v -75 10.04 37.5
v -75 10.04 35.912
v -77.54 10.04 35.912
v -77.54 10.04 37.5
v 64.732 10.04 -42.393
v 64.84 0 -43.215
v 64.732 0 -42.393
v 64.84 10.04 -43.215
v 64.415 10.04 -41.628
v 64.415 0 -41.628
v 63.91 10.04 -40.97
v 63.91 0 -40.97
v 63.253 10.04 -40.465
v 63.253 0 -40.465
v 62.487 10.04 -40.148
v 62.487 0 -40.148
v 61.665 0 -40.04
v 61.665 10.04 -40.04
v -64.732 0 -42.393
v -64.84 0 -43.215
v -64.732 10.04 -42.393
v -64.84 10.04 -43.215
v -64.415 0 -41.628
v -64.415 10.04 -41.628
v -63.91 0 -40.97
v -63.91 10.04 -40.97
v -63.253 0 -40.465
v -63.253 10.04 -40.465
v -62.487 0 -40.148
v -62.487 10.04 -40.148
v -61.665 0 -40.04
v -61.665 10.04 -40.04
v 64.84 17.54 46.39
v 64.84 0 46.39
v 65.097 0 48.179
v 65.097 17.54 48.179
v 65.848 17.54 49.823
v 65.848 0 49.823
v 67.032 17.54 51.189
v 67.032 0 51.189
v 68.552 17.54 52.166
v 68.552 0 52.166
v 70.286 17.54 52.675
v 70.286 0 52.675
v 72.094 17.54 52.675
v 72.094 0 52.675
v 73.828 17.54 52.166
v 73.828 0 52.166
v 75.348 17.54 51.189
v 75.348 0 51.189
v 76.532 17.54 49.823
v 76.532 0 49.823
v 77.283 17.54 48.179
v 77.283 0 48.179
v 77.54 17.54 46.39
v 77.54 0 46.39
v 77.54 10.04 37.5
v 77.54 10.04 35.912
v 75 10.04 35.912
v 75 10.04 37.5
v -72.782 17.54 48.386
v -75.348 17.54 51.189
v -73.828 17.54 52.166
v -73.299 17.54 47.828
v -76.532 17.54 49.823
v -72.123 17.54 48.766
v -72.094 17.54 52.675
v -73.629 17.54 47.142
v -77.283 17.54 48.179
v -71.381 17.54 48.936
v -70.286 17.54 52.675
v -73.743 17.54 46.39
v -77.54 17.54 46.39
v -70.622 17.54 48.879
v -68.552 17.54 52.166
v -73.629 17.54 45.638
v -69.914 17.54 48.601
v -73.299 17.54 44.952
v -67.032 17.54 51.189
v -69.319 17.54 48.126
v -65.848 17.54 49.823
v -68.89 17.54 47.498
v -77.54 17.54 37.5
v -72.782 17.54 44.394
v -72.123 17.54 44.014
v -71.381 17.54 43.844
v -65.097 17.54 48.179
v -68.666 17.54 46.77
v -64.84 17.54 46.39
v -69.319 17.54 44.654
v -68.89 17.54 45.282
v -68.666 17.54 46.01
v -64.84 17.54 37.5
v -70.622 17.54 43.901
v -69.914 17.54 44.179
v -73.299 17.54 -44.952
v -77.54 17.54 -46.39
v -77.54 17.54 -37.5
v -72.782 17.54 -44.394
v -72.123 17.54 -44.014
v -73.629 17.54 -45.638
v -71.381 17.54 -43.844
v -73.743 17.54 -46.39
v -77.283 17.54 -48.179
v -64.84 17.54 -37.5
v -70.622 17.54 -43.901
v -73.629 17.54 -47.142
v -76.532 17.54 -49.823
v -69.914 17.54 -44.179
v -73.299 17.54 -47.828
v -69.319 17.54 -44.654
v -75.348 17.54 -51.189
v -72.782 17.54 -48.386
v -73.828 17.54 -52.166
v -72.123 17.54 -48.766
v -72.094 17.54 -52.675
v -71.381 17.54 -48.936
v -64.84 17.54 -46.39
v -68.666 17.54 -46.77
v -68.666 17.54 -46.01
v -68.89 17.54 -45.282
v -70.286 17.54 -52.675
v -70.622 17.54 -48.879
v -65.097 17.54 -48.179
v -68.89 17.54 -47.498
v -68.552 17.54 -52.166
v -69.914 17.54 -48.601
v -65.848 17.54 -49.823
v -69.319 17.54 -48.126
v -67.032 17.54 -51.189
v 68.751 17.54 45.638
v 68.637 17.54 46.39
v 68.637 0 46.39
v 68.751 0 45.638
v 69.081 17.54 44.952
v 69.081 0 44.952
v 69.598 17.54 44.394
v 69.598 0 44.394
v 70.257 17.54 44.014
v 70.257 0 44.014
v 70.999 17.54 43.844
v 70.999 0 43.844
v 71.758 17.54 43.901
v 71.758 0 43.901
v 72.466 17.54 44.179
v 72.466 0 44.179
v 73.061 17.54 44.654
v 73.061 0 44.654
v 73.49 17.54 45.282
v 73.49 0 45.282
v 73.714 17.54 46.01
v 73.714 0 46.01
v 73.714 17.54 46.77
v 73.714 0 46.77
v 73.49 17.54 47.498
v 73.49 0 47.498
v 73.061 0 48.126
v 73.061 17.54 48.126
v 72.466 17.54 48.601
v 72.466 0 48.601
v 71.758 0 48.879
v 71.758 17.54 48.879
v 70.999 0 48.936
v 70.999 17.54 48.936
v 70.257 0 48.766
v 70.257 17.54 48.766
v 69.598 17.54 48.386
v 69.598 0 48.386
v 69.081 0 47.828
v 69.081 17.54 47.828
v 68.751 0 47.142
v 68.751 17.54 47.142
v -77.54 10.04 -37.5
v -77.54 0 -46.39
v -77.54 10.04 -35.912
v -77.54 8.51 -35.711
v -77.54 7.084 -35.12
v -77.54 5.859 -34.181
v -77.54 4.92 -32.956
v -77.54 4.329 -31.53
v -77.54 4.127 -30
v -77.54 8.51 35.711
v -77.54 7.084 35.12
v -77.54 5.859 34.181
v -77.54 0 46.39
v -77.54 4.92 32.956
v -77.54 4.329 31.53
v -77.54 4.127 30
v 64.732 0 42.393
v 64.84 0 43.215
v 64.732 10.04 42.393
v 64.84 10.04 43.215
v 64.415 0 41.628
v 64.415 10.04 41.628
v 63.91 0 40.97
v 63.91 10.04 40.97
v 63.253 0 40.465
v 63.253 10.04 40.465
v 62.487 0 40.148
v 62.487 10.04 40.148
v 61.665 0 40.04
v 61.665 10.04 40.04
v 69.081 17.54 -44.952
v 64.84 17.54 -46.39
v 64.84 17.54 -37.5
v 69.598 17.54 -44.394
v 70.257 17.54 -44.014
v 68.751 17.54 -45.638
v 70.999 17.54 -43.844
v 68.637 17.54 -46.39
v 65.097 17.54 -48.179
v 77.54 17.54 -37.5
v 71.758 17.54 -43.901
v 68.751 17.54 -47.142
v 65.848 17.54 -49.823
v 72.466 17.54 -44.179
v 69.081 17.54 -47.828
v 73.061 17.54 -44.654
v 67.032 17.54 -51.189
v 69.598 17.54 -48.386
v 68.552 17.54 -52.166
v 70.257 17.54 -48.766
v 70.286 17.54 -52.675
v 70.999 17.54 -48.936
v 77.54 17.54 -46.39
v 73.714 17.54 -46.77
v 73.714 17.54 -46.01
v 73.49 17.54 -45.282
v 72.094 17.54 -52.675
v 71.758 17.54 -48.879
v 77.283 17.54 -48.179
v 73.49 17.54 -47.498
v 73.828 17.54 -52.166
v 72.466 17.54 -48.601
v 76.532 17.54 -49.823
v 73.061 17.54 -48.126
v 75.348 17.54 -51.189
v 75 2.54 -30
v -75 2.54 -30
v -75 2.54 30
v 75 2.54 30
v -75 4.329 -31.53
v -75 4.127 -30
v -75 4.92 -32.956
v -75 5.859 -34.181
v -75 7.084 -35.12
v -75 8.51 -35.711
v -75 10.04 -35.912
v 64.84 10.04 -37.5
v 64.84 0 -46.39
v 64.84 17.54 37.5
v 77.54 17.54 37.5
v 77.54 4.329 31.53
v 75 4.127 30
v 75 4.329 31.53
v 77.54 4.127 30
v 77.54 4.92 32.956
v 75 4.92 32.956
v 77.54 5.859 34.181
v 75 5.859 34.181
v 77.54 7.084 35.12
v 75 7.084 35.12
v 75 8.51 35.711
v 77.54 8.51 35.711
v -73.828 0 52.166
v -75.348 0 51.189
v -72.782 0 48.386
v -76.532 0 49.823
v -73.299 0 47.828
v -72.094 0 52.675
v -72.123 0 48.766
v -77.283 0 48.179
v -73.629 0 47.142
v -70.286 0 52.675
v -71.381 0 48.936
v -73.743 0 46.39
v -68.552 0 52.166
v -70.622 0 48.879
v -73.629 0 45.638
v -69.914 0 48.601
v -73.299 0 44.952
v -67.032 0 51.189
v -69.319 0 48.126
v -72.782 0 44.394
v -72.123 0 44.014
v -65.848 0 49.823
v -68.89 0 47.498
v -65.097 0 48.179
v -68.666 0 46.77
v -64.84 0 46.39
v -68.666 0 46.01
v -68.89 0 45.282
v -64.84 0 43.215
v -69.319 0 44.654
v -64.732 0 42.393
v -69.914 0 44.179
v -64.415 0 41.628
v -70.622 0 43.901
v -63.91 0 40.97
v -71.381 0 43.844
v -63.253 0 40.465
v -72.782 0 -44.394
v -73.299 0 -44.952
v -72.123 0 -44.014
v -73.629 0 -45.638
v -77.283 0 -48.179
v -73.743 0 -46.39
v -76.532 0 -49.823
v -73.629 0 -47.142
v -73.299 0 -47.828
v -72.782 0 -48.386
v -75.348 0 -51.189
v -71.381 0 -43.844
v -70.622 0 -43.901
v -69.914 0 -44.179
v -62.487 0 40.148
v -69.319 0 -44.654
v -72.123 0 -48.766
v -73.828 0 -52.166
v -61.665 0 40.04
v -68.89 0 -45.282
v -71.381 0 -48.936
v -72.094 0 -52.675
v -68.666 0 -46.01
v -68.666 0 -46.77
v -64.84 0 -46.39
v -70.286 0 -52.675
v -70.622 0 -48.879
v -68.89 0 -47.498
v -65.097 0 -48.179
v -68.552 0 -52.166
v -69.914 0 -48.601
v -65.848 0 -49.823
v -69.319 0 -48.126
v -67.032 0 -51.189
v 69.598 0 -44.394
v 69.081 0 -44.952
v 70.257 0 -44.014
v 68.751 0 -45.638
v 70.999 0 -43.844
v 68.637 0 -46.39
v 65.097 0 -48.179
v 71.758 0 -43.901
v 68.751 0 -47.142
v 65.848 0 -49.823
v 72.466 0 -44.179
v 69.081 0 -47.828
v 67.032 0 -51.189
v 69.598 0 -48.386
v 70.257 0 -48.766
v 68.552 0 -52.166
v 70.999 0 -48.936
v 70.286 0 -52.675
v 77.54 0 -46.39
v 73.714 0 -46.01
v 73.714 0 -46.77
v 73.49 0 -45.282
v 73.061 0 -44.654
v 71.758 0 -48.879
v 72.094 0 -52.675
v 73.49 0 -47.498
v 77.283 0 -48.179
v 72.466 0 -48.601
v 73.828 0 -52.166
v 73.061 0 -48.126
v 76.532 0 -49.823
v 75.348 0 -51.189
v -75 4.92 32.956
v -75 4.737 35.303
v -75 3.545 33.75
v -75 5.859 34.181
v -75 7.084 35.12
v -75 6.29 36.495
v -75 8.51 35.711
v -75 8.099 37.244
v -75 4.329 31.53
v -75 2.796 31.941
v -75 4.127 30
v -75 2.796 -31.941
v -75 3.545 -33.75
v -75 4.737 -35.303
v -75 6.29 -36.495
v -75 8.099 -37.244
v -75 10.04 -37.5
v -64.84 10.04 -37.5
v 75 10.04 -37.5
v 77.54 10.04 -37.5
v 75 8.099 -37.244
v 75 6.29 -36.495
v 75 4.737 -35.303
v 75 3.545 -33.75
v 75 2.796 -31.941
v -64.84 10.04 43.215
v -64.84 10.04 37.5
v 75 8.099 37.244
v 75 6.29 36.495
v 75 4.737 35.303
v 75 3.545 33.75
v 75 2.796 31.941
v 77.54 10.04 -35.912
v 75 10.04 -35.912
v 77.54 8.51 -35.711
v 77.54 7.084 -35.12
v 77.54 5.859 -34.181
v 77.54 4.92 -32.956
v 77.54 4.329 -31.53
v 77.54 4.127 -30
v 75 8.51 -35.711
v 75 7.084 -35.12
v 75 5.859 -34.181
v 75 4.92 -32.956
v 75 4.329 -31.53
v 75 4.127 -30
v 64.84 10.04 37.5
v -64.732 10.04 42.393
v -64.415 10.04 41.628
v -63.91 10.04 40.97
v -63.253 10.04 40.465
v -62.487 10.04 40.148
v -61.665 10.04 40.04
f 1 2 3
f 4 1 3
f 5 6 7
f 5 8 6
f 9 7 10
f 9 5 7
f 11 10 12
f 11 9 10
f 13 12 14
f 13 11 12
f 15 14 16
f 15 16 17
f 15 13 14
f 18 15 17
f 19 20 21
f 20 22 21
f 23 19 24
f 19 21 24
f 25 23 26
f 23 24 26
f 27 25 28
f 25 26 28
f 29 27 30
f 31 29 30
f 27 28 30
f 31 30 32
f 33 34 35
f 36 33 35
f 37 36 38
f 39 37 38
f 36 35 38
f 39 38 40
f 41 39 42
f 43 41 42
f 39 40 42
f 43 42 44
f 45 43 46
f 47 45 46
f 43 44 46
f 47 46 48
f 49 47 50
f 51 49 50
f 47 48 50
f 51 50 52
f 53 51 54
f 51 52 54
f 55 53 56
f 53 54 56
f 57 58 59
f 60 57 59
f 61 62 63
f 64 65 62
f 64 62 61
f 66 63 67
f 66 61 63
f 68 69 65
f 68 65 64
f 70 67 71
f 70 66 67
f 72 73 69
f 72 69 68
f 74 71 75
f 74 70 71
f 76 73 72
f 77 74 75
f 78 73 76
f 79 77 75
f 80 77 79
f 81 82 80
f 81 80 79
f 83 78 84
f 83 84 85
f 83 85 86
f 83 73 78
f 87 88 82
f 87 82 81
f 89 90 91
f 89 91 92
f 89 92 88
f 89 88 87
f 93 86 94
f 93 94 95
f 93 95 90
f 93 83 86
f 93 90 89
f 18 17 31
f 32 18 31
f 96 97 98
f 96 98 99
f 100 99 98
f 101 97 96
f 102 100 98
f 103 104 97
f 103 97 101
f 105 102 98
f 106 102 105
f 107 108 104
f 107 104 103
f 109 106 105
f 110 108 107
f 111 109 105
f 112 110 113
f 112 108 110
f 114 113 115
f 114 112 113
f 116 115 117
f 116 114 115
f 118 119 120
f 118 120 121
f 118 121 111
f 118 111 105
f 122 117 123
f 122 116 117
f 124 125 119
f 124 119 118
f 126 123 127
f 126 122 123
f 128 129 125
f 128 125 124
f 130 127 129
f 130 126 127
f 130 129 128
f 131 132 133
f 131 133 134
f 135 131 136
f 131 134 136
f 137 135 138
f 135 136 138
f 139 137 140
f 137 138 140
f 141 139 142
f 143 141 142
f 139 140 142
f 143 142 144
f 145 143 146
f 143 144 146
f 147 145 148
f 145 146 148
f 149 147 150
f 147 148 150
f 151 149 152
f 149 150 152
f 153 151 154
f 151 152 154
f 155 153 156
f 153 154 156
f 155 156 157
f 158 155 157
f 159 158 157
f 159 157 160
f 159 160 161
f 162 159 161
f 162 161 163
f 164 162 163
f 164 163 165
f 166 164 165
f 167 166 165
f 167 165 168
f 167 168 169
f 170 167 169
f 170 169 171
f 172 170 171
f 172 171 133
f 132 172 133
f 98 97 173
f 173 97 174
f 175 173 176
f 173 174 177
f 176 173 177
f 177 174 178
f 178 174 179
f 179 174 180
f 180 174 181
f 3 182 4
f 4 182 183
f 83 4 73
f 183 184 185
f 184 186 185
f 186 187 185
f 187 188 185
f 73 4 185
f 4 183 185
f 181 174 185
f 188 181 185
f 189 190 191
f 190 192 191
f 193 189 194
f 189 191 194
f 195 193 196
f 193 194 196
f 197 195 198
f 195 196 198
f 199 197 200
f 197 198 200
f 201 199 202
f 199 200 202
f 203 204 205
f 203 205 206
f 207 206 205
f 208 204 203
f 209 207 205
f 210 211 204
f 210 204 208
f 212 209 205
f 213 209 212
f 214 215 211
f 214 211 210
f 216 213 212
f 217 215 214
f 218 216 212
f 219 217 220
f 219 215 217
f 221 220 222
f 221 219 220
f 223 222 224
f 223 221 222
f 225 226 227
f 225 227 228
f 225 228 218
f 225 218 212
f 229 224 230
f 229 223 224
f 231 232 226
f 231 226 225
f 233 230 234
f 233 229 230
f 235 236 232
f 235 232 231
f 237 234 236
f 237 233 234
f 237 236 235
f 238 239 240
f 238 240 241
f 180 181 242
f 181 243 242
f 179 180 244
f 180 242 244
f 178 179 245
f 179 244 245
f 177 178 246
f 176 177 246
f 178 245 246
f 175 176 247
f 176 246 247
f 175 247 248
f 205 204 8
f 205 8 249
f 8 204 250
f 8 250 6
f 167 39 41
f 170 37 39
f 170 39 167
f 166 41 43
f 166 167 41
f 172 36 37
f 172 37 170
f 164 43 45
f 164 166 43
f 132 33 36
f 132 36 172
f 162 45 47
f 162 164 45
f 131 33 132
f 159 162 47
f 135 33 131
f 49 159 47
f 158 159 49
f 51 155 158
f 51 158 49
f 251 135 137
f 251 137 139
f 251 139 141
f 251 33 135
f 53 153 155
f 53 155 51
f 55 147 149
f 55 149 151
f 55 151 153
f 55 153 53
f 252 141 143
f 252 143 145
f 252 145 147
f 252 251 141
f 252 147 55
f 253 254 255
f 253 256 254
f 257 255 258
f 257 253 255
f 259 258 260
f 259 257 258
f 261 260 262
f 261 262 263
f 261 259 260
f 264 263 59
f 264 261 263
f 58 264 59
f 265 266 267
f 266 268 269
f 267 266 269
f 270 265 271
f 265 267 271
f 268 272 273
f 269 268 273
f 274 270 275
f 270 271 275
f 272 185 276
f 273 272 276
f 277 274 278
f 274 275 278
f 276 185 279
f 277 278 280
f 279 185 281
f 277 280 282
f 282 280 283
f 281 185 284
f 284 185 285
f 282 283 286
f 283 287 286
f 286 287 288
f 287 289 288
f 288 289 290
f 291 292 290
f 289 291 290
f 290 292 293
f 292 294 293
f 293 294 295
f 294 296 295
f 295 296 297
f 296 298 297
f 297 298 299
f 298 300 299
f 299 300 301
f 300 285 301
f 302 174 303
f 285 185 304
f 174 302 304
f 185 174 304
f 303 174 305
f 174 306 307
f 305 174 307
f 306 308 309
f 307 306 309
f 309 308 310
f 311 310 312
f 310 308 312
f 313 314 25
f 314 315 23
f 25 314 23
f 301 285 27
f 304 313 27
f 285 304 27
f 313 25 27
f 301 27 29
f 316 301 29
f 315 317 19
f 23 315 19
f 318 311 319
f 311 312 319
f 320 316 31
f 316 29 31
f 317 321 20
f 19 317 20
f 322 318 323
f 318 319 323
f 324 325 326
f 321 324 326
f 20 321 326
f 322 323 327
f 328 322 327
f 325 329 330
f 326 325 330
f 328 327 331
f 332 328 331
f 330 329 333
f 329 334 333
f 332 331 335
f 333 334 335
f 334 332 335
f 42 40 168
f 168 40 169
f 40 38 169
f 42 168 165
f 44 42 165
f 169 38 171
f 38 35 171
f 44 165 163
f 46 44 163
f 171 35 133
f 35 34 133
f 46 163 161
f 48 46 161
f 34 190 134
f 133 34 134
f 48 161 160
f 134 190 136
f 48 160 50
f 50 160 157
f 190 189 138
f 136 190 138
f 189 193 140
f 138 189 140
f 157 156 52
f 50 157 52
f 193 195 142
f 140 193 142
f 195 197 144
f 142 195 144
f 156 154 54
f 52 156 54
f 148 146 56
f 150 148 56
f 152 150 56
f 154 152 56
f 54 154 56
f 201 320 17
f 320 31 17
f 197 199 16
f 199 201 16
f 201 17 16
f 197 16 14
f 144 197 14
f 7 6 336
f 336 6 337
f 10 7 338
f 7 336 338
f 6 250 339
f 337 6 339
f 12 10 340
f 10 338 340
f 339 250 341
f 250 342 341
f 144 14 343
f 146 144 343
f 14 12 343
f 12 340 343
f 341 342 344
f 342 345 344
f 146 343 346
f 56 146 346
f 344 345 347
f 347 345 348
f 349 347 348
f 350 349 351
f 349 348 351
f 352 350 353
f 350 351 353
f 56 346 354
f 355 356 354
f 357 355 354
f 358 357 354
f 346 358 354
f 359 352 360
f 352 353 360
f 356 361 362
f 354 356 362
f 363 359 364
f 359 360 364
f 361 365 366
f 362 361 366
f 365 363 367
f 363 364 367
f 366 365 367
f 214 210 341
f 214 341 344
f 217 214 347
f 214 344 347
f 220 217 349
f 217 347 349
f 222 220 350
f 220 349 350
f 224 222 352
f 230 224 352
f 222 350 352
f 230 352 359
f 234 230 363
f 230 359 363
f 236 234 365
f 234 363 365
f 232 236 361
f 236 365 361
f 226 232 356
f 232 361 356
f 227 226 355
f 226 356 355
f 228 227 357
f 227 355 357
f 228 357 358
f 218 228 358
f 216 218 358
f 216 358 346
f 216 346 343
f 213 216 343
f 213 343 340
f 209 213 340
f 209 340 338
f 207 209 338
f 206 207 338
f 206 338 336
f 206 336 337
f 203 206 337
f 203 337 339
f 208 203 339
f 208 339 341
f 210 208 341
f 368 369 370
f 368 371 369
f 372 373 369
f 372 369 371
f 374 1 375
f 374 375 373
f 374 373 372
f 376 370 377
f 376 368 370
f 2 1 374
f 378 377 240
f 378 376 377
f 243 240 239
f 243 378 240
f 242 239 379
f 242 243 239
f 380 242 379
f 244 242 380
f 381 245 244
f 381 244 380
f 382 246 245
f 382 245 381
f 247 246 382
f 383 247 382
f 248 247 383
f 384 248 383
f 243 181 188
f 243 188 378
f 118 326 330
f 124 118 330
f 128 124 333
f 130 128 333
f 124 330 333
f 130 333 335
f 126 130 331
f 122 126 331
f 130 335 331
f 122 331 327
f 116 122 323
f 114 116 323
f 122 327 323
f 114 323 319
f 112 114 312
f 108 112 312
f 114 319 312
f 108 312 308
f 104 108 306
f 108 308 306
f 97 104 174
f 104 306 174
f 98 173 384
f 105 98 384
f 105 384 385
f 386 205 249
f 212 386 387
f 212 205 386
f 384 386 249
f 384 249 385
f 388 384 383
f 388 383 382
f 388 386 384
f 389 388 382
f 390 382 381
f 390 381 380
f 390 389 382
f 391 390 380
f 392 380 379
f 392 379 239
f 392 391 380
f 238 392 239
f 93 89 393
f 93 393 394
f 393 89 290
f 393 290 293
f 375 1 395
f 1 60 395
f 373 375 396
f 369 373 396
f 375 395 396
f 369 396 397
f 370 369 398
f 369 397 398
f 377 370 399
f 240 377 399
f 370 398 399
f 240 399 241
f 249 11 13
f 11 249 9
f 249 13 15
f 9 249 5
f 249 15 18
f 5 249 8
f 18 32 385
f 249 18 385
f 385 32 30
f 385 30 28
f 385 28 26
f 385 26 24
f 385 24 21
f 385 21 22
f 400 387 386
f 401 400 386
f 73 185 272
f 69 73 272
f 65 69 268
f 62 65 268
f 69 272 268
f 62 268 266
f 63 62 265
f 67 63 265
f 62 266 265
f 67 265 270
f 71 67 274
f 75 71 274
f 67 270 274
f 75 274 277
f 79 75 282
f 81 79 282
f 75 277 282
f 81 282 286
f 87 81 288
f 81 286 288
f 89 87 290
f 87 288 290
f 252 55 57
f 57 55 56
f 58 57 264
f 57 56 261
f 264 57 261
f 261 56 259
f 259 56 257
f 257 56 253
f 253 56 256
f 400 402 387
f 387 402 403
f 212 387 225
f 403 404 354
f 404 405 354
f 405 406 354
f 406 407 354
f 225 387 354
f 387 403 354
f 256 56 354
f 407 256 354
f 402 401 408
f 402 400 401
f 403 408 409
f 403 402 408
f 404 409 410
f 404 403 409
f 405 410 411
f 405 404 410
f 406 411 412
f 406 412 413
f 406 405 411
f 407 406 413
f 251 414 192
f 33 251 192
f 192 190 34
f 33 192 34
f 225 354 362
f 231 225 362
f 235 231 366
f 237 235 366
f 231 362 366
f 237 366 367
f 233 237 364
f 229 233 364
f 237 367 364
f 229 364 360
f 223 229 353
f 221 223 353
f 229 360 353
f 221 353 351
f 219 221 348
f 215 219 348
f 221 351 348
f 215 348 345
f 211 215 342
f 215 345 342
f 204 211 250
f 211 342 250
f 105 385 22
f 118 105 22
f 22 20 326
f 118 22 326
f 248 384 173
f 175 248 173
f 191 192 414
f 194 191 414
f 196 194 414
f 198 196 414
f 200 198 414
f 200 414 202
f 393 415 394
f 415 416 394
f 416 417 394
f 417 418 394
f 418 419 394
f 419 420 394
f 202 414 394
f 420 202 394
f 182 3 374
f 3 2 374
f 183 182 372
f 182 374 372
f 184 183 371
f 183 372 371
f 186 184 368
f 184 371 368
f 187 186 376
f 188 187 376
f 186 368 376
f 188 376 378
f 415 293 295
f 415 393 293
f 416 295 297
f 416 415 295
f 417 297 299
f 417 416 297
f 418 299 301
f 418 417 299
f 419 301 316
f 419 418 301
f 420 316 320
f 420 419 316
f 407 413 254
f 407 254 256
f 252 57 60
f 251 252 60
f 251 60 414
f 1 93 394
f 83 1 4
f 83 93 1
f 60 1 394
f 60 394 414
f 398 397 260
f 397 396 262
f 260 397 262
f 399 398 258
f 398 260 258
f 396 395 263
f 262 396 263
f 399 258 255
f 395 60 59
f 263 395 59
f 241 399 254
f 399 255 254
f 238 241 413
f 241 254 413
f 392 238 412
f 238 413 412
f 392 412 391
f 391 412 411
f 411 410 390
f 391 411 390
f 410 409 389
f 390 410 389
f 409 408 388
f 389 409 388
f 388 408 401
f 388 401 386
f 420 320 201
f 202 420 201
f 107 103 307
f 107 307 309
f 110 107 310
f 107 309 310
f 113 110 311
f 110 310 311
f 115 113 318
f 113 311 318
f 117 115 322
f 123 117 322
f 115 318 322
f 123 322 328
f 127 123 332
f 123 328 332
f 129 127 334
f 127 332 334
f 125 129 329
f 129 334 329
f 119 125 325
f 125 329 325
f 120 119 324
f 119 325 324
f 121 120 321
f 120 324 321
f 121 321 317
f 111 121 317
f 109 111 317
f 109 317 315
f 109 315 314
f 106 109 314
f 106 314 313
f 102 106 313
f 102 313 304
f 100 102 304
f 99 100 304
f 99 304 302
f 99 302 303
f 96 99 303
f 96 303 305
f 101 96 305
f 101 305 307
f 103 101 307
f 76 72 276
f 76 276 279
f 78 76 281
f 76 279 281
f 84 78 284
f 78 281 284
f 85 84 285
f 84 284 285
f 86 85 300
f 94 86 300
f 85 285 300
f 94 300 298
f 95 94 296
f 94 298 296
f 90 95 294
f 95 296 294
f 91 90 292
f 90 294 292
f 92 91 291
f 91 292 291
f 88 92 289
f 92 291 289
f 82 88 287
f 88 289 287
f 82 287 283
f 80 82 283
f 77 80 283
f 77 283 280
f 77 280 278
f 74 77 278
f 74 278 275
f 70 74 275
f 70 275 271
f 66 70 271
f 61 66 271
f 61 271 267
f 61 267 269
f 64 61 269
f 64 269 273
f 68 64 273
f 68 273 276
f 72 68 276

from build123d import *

# Parameters (mm, degrees)
BOSS_EXTRUDE1_DEPTH    = 17.539999972
F_10_CLEARANCE_HOLE1_D = 5.1054
SKETCH3_W              = 150
SKETCH3_H              = 75
CUT_EXTRUDE1_DEPTH     = 14.999999972
SKETCH4_W              = 155.08
SKETCH4_H              = 71.825
CUT_EXTRUDE2_DEPTH     = 13.412499972
CUT_EXTRUDE3_DEPTH     = 7.5
FILLET2_R              = 5.9125
FILLET1_R              = 7.5
FILLET3_R              = 3.175


with BuildPart() as part:
    # Sketch1 → Boss-Extrude1 (new body)
    with BuildSketch(Plane(origin=(0, 0, 0), x_dir=(1, 0, 0), z_dir=(0, 1, 0))):
        with BuildLine():
            Line((77.54, -40.04), (77.54, 40.04))
            Line((77.54, 40.04), (77.54, 46.39))
            ThreePointArc((77.54, 46.39), (71.19, 52.74), (64.84, 46.39))
            Line((64.84, 46.39), (64.84, 40.04))
            Line((64.84, 40.04), (-64.84, 40.04))
            Line((-64.84, 40.04), (-64.84, 46.39))
            ThreePointArc((-64.84, 46.39), (-71.19, 52.74), (-77.54, 46.39))
            Line((-77.54, 46.39), (-77.54, 40.04))
            Line((-77.54, 40.04), (-77.54, -40.04))
            Line((-77.54, -40.04), (-77.54, -46.39))
            ThreePointArc((-77.54, -46.39), (-71.19, -52.74), (-64.84, -46.39))
            Line((-64.84, -46.39), (-64.84, -40.04))
            Line((-64.84, -40.04), (64.84, -40.04))
            Line((64.84, -40.04), (64.84, -46.39))
            ThreePointArc((64.84, -46.39), (71.19, -52.74), (77.54, -46.39))
            Line((77.54, -46.39), (77.54, -40.04))
        make_face()
    extrude(amount=BOSS_EXTRUDE1_DEPTH)

    # #10 Clearance Hole1 (through all)
    with Locations(Plane(origin=(0, 17.539999972, 0), x_dir=(1, 0, 0), z_dir=(0, 1, 0))):
        with Locations((-71.19, 46.39), (71.19, 46.39), (71.19, -46.39), (-71.19, -46.39)):
            Hole(F_10_CLEARANCE_HOLE1_D / 2)

    # Sketch3 → Cut-Extrude1 (cut)
    with BuildSketch(Plane(origin=(0, 17.539999972, 0), x_dir=(1, 0, 0), z_dir=(0, 1, 0))):
        Rectangle(SKETCH3_W, SKETCH3_H)
    extrude(amount=-CUT_EXTRUDE1_DEPTH, mode=Mode.SUBTRACT)

    # Sketch4 → Cut-Extrude2 (cut)
    with BuildSketch(Plane(origin=(0, 17.539999972, 0), x_dir=(1, 0, 0), z_dir=(0, 1, 0))):
        Rectangle(SKETCH4_W, SKETCH4_H)
    extrude(amount=-CUT_EXTRUDE2_DEPTH, mode=Mode.SUBTRACT)

    # Sketch8 → Cut-Extrude3 (cut)
    with BuildSketch(Plane(origin=(0, 17.539999972, 0), x_dir=(1, 0, 0), z_dir=(0, 1, 0))):
        Polygon((-77.54, 37.5), (-64.84, 37.5), (-64.84, 40.04), (64.84, 40.04), (64.84, 37.5), (77.54, 37.5), (77.54, -37.5), (64.84, -37.5), (64.84, -40.04), (-64.84, -40.04), (-64.84, -37.5), (-77.54, -37.5), align=None)
    extrude(amount=-CUT_EXTRUDE3_DEPTH, mode=Mode.SUBTRACT)

    # Fillet2
    fillet2_edges = [part.edges().sort_by_distance(p)[0] for p in [
        (-76.27, 4.1275, -35.9125),
        (-76.27, 4.1275, 35.9125),
        (76.27, 4.1275, 35.9125),
        (76.27, 4.1275, -35.9125),
    ]]
    fillet(fillet2_edges, radius=FILLET2_R - 0.0001)  # a hair under: the kernel refuses the full size

    # Fillet1
    fillet1_edges = [part.edges().sort_by_distance(p)[0] for p in [
        (0, 2.54, 37.5),
        (0, 2.54, -37.5),
    ]]
    fillet(fillet1_edges, radius=FILLET1_R - 0.0001)  # a hair under: the kernel refuses the full size

    # Fillet3
    fillet3_edges = [part.edges().sort_by_distance(p)[0] for p in [
        (64.84, 5.019999986, 40.04),
        (-64.84, 5.019999986, 40.04),
        (-64.84, 5.019999986, -40.04),
        (64.84, 5.019999986, -40.04),
    ]]
    fillet(fillet3_edges, radius=FILLET3_R)


solid = part.part
